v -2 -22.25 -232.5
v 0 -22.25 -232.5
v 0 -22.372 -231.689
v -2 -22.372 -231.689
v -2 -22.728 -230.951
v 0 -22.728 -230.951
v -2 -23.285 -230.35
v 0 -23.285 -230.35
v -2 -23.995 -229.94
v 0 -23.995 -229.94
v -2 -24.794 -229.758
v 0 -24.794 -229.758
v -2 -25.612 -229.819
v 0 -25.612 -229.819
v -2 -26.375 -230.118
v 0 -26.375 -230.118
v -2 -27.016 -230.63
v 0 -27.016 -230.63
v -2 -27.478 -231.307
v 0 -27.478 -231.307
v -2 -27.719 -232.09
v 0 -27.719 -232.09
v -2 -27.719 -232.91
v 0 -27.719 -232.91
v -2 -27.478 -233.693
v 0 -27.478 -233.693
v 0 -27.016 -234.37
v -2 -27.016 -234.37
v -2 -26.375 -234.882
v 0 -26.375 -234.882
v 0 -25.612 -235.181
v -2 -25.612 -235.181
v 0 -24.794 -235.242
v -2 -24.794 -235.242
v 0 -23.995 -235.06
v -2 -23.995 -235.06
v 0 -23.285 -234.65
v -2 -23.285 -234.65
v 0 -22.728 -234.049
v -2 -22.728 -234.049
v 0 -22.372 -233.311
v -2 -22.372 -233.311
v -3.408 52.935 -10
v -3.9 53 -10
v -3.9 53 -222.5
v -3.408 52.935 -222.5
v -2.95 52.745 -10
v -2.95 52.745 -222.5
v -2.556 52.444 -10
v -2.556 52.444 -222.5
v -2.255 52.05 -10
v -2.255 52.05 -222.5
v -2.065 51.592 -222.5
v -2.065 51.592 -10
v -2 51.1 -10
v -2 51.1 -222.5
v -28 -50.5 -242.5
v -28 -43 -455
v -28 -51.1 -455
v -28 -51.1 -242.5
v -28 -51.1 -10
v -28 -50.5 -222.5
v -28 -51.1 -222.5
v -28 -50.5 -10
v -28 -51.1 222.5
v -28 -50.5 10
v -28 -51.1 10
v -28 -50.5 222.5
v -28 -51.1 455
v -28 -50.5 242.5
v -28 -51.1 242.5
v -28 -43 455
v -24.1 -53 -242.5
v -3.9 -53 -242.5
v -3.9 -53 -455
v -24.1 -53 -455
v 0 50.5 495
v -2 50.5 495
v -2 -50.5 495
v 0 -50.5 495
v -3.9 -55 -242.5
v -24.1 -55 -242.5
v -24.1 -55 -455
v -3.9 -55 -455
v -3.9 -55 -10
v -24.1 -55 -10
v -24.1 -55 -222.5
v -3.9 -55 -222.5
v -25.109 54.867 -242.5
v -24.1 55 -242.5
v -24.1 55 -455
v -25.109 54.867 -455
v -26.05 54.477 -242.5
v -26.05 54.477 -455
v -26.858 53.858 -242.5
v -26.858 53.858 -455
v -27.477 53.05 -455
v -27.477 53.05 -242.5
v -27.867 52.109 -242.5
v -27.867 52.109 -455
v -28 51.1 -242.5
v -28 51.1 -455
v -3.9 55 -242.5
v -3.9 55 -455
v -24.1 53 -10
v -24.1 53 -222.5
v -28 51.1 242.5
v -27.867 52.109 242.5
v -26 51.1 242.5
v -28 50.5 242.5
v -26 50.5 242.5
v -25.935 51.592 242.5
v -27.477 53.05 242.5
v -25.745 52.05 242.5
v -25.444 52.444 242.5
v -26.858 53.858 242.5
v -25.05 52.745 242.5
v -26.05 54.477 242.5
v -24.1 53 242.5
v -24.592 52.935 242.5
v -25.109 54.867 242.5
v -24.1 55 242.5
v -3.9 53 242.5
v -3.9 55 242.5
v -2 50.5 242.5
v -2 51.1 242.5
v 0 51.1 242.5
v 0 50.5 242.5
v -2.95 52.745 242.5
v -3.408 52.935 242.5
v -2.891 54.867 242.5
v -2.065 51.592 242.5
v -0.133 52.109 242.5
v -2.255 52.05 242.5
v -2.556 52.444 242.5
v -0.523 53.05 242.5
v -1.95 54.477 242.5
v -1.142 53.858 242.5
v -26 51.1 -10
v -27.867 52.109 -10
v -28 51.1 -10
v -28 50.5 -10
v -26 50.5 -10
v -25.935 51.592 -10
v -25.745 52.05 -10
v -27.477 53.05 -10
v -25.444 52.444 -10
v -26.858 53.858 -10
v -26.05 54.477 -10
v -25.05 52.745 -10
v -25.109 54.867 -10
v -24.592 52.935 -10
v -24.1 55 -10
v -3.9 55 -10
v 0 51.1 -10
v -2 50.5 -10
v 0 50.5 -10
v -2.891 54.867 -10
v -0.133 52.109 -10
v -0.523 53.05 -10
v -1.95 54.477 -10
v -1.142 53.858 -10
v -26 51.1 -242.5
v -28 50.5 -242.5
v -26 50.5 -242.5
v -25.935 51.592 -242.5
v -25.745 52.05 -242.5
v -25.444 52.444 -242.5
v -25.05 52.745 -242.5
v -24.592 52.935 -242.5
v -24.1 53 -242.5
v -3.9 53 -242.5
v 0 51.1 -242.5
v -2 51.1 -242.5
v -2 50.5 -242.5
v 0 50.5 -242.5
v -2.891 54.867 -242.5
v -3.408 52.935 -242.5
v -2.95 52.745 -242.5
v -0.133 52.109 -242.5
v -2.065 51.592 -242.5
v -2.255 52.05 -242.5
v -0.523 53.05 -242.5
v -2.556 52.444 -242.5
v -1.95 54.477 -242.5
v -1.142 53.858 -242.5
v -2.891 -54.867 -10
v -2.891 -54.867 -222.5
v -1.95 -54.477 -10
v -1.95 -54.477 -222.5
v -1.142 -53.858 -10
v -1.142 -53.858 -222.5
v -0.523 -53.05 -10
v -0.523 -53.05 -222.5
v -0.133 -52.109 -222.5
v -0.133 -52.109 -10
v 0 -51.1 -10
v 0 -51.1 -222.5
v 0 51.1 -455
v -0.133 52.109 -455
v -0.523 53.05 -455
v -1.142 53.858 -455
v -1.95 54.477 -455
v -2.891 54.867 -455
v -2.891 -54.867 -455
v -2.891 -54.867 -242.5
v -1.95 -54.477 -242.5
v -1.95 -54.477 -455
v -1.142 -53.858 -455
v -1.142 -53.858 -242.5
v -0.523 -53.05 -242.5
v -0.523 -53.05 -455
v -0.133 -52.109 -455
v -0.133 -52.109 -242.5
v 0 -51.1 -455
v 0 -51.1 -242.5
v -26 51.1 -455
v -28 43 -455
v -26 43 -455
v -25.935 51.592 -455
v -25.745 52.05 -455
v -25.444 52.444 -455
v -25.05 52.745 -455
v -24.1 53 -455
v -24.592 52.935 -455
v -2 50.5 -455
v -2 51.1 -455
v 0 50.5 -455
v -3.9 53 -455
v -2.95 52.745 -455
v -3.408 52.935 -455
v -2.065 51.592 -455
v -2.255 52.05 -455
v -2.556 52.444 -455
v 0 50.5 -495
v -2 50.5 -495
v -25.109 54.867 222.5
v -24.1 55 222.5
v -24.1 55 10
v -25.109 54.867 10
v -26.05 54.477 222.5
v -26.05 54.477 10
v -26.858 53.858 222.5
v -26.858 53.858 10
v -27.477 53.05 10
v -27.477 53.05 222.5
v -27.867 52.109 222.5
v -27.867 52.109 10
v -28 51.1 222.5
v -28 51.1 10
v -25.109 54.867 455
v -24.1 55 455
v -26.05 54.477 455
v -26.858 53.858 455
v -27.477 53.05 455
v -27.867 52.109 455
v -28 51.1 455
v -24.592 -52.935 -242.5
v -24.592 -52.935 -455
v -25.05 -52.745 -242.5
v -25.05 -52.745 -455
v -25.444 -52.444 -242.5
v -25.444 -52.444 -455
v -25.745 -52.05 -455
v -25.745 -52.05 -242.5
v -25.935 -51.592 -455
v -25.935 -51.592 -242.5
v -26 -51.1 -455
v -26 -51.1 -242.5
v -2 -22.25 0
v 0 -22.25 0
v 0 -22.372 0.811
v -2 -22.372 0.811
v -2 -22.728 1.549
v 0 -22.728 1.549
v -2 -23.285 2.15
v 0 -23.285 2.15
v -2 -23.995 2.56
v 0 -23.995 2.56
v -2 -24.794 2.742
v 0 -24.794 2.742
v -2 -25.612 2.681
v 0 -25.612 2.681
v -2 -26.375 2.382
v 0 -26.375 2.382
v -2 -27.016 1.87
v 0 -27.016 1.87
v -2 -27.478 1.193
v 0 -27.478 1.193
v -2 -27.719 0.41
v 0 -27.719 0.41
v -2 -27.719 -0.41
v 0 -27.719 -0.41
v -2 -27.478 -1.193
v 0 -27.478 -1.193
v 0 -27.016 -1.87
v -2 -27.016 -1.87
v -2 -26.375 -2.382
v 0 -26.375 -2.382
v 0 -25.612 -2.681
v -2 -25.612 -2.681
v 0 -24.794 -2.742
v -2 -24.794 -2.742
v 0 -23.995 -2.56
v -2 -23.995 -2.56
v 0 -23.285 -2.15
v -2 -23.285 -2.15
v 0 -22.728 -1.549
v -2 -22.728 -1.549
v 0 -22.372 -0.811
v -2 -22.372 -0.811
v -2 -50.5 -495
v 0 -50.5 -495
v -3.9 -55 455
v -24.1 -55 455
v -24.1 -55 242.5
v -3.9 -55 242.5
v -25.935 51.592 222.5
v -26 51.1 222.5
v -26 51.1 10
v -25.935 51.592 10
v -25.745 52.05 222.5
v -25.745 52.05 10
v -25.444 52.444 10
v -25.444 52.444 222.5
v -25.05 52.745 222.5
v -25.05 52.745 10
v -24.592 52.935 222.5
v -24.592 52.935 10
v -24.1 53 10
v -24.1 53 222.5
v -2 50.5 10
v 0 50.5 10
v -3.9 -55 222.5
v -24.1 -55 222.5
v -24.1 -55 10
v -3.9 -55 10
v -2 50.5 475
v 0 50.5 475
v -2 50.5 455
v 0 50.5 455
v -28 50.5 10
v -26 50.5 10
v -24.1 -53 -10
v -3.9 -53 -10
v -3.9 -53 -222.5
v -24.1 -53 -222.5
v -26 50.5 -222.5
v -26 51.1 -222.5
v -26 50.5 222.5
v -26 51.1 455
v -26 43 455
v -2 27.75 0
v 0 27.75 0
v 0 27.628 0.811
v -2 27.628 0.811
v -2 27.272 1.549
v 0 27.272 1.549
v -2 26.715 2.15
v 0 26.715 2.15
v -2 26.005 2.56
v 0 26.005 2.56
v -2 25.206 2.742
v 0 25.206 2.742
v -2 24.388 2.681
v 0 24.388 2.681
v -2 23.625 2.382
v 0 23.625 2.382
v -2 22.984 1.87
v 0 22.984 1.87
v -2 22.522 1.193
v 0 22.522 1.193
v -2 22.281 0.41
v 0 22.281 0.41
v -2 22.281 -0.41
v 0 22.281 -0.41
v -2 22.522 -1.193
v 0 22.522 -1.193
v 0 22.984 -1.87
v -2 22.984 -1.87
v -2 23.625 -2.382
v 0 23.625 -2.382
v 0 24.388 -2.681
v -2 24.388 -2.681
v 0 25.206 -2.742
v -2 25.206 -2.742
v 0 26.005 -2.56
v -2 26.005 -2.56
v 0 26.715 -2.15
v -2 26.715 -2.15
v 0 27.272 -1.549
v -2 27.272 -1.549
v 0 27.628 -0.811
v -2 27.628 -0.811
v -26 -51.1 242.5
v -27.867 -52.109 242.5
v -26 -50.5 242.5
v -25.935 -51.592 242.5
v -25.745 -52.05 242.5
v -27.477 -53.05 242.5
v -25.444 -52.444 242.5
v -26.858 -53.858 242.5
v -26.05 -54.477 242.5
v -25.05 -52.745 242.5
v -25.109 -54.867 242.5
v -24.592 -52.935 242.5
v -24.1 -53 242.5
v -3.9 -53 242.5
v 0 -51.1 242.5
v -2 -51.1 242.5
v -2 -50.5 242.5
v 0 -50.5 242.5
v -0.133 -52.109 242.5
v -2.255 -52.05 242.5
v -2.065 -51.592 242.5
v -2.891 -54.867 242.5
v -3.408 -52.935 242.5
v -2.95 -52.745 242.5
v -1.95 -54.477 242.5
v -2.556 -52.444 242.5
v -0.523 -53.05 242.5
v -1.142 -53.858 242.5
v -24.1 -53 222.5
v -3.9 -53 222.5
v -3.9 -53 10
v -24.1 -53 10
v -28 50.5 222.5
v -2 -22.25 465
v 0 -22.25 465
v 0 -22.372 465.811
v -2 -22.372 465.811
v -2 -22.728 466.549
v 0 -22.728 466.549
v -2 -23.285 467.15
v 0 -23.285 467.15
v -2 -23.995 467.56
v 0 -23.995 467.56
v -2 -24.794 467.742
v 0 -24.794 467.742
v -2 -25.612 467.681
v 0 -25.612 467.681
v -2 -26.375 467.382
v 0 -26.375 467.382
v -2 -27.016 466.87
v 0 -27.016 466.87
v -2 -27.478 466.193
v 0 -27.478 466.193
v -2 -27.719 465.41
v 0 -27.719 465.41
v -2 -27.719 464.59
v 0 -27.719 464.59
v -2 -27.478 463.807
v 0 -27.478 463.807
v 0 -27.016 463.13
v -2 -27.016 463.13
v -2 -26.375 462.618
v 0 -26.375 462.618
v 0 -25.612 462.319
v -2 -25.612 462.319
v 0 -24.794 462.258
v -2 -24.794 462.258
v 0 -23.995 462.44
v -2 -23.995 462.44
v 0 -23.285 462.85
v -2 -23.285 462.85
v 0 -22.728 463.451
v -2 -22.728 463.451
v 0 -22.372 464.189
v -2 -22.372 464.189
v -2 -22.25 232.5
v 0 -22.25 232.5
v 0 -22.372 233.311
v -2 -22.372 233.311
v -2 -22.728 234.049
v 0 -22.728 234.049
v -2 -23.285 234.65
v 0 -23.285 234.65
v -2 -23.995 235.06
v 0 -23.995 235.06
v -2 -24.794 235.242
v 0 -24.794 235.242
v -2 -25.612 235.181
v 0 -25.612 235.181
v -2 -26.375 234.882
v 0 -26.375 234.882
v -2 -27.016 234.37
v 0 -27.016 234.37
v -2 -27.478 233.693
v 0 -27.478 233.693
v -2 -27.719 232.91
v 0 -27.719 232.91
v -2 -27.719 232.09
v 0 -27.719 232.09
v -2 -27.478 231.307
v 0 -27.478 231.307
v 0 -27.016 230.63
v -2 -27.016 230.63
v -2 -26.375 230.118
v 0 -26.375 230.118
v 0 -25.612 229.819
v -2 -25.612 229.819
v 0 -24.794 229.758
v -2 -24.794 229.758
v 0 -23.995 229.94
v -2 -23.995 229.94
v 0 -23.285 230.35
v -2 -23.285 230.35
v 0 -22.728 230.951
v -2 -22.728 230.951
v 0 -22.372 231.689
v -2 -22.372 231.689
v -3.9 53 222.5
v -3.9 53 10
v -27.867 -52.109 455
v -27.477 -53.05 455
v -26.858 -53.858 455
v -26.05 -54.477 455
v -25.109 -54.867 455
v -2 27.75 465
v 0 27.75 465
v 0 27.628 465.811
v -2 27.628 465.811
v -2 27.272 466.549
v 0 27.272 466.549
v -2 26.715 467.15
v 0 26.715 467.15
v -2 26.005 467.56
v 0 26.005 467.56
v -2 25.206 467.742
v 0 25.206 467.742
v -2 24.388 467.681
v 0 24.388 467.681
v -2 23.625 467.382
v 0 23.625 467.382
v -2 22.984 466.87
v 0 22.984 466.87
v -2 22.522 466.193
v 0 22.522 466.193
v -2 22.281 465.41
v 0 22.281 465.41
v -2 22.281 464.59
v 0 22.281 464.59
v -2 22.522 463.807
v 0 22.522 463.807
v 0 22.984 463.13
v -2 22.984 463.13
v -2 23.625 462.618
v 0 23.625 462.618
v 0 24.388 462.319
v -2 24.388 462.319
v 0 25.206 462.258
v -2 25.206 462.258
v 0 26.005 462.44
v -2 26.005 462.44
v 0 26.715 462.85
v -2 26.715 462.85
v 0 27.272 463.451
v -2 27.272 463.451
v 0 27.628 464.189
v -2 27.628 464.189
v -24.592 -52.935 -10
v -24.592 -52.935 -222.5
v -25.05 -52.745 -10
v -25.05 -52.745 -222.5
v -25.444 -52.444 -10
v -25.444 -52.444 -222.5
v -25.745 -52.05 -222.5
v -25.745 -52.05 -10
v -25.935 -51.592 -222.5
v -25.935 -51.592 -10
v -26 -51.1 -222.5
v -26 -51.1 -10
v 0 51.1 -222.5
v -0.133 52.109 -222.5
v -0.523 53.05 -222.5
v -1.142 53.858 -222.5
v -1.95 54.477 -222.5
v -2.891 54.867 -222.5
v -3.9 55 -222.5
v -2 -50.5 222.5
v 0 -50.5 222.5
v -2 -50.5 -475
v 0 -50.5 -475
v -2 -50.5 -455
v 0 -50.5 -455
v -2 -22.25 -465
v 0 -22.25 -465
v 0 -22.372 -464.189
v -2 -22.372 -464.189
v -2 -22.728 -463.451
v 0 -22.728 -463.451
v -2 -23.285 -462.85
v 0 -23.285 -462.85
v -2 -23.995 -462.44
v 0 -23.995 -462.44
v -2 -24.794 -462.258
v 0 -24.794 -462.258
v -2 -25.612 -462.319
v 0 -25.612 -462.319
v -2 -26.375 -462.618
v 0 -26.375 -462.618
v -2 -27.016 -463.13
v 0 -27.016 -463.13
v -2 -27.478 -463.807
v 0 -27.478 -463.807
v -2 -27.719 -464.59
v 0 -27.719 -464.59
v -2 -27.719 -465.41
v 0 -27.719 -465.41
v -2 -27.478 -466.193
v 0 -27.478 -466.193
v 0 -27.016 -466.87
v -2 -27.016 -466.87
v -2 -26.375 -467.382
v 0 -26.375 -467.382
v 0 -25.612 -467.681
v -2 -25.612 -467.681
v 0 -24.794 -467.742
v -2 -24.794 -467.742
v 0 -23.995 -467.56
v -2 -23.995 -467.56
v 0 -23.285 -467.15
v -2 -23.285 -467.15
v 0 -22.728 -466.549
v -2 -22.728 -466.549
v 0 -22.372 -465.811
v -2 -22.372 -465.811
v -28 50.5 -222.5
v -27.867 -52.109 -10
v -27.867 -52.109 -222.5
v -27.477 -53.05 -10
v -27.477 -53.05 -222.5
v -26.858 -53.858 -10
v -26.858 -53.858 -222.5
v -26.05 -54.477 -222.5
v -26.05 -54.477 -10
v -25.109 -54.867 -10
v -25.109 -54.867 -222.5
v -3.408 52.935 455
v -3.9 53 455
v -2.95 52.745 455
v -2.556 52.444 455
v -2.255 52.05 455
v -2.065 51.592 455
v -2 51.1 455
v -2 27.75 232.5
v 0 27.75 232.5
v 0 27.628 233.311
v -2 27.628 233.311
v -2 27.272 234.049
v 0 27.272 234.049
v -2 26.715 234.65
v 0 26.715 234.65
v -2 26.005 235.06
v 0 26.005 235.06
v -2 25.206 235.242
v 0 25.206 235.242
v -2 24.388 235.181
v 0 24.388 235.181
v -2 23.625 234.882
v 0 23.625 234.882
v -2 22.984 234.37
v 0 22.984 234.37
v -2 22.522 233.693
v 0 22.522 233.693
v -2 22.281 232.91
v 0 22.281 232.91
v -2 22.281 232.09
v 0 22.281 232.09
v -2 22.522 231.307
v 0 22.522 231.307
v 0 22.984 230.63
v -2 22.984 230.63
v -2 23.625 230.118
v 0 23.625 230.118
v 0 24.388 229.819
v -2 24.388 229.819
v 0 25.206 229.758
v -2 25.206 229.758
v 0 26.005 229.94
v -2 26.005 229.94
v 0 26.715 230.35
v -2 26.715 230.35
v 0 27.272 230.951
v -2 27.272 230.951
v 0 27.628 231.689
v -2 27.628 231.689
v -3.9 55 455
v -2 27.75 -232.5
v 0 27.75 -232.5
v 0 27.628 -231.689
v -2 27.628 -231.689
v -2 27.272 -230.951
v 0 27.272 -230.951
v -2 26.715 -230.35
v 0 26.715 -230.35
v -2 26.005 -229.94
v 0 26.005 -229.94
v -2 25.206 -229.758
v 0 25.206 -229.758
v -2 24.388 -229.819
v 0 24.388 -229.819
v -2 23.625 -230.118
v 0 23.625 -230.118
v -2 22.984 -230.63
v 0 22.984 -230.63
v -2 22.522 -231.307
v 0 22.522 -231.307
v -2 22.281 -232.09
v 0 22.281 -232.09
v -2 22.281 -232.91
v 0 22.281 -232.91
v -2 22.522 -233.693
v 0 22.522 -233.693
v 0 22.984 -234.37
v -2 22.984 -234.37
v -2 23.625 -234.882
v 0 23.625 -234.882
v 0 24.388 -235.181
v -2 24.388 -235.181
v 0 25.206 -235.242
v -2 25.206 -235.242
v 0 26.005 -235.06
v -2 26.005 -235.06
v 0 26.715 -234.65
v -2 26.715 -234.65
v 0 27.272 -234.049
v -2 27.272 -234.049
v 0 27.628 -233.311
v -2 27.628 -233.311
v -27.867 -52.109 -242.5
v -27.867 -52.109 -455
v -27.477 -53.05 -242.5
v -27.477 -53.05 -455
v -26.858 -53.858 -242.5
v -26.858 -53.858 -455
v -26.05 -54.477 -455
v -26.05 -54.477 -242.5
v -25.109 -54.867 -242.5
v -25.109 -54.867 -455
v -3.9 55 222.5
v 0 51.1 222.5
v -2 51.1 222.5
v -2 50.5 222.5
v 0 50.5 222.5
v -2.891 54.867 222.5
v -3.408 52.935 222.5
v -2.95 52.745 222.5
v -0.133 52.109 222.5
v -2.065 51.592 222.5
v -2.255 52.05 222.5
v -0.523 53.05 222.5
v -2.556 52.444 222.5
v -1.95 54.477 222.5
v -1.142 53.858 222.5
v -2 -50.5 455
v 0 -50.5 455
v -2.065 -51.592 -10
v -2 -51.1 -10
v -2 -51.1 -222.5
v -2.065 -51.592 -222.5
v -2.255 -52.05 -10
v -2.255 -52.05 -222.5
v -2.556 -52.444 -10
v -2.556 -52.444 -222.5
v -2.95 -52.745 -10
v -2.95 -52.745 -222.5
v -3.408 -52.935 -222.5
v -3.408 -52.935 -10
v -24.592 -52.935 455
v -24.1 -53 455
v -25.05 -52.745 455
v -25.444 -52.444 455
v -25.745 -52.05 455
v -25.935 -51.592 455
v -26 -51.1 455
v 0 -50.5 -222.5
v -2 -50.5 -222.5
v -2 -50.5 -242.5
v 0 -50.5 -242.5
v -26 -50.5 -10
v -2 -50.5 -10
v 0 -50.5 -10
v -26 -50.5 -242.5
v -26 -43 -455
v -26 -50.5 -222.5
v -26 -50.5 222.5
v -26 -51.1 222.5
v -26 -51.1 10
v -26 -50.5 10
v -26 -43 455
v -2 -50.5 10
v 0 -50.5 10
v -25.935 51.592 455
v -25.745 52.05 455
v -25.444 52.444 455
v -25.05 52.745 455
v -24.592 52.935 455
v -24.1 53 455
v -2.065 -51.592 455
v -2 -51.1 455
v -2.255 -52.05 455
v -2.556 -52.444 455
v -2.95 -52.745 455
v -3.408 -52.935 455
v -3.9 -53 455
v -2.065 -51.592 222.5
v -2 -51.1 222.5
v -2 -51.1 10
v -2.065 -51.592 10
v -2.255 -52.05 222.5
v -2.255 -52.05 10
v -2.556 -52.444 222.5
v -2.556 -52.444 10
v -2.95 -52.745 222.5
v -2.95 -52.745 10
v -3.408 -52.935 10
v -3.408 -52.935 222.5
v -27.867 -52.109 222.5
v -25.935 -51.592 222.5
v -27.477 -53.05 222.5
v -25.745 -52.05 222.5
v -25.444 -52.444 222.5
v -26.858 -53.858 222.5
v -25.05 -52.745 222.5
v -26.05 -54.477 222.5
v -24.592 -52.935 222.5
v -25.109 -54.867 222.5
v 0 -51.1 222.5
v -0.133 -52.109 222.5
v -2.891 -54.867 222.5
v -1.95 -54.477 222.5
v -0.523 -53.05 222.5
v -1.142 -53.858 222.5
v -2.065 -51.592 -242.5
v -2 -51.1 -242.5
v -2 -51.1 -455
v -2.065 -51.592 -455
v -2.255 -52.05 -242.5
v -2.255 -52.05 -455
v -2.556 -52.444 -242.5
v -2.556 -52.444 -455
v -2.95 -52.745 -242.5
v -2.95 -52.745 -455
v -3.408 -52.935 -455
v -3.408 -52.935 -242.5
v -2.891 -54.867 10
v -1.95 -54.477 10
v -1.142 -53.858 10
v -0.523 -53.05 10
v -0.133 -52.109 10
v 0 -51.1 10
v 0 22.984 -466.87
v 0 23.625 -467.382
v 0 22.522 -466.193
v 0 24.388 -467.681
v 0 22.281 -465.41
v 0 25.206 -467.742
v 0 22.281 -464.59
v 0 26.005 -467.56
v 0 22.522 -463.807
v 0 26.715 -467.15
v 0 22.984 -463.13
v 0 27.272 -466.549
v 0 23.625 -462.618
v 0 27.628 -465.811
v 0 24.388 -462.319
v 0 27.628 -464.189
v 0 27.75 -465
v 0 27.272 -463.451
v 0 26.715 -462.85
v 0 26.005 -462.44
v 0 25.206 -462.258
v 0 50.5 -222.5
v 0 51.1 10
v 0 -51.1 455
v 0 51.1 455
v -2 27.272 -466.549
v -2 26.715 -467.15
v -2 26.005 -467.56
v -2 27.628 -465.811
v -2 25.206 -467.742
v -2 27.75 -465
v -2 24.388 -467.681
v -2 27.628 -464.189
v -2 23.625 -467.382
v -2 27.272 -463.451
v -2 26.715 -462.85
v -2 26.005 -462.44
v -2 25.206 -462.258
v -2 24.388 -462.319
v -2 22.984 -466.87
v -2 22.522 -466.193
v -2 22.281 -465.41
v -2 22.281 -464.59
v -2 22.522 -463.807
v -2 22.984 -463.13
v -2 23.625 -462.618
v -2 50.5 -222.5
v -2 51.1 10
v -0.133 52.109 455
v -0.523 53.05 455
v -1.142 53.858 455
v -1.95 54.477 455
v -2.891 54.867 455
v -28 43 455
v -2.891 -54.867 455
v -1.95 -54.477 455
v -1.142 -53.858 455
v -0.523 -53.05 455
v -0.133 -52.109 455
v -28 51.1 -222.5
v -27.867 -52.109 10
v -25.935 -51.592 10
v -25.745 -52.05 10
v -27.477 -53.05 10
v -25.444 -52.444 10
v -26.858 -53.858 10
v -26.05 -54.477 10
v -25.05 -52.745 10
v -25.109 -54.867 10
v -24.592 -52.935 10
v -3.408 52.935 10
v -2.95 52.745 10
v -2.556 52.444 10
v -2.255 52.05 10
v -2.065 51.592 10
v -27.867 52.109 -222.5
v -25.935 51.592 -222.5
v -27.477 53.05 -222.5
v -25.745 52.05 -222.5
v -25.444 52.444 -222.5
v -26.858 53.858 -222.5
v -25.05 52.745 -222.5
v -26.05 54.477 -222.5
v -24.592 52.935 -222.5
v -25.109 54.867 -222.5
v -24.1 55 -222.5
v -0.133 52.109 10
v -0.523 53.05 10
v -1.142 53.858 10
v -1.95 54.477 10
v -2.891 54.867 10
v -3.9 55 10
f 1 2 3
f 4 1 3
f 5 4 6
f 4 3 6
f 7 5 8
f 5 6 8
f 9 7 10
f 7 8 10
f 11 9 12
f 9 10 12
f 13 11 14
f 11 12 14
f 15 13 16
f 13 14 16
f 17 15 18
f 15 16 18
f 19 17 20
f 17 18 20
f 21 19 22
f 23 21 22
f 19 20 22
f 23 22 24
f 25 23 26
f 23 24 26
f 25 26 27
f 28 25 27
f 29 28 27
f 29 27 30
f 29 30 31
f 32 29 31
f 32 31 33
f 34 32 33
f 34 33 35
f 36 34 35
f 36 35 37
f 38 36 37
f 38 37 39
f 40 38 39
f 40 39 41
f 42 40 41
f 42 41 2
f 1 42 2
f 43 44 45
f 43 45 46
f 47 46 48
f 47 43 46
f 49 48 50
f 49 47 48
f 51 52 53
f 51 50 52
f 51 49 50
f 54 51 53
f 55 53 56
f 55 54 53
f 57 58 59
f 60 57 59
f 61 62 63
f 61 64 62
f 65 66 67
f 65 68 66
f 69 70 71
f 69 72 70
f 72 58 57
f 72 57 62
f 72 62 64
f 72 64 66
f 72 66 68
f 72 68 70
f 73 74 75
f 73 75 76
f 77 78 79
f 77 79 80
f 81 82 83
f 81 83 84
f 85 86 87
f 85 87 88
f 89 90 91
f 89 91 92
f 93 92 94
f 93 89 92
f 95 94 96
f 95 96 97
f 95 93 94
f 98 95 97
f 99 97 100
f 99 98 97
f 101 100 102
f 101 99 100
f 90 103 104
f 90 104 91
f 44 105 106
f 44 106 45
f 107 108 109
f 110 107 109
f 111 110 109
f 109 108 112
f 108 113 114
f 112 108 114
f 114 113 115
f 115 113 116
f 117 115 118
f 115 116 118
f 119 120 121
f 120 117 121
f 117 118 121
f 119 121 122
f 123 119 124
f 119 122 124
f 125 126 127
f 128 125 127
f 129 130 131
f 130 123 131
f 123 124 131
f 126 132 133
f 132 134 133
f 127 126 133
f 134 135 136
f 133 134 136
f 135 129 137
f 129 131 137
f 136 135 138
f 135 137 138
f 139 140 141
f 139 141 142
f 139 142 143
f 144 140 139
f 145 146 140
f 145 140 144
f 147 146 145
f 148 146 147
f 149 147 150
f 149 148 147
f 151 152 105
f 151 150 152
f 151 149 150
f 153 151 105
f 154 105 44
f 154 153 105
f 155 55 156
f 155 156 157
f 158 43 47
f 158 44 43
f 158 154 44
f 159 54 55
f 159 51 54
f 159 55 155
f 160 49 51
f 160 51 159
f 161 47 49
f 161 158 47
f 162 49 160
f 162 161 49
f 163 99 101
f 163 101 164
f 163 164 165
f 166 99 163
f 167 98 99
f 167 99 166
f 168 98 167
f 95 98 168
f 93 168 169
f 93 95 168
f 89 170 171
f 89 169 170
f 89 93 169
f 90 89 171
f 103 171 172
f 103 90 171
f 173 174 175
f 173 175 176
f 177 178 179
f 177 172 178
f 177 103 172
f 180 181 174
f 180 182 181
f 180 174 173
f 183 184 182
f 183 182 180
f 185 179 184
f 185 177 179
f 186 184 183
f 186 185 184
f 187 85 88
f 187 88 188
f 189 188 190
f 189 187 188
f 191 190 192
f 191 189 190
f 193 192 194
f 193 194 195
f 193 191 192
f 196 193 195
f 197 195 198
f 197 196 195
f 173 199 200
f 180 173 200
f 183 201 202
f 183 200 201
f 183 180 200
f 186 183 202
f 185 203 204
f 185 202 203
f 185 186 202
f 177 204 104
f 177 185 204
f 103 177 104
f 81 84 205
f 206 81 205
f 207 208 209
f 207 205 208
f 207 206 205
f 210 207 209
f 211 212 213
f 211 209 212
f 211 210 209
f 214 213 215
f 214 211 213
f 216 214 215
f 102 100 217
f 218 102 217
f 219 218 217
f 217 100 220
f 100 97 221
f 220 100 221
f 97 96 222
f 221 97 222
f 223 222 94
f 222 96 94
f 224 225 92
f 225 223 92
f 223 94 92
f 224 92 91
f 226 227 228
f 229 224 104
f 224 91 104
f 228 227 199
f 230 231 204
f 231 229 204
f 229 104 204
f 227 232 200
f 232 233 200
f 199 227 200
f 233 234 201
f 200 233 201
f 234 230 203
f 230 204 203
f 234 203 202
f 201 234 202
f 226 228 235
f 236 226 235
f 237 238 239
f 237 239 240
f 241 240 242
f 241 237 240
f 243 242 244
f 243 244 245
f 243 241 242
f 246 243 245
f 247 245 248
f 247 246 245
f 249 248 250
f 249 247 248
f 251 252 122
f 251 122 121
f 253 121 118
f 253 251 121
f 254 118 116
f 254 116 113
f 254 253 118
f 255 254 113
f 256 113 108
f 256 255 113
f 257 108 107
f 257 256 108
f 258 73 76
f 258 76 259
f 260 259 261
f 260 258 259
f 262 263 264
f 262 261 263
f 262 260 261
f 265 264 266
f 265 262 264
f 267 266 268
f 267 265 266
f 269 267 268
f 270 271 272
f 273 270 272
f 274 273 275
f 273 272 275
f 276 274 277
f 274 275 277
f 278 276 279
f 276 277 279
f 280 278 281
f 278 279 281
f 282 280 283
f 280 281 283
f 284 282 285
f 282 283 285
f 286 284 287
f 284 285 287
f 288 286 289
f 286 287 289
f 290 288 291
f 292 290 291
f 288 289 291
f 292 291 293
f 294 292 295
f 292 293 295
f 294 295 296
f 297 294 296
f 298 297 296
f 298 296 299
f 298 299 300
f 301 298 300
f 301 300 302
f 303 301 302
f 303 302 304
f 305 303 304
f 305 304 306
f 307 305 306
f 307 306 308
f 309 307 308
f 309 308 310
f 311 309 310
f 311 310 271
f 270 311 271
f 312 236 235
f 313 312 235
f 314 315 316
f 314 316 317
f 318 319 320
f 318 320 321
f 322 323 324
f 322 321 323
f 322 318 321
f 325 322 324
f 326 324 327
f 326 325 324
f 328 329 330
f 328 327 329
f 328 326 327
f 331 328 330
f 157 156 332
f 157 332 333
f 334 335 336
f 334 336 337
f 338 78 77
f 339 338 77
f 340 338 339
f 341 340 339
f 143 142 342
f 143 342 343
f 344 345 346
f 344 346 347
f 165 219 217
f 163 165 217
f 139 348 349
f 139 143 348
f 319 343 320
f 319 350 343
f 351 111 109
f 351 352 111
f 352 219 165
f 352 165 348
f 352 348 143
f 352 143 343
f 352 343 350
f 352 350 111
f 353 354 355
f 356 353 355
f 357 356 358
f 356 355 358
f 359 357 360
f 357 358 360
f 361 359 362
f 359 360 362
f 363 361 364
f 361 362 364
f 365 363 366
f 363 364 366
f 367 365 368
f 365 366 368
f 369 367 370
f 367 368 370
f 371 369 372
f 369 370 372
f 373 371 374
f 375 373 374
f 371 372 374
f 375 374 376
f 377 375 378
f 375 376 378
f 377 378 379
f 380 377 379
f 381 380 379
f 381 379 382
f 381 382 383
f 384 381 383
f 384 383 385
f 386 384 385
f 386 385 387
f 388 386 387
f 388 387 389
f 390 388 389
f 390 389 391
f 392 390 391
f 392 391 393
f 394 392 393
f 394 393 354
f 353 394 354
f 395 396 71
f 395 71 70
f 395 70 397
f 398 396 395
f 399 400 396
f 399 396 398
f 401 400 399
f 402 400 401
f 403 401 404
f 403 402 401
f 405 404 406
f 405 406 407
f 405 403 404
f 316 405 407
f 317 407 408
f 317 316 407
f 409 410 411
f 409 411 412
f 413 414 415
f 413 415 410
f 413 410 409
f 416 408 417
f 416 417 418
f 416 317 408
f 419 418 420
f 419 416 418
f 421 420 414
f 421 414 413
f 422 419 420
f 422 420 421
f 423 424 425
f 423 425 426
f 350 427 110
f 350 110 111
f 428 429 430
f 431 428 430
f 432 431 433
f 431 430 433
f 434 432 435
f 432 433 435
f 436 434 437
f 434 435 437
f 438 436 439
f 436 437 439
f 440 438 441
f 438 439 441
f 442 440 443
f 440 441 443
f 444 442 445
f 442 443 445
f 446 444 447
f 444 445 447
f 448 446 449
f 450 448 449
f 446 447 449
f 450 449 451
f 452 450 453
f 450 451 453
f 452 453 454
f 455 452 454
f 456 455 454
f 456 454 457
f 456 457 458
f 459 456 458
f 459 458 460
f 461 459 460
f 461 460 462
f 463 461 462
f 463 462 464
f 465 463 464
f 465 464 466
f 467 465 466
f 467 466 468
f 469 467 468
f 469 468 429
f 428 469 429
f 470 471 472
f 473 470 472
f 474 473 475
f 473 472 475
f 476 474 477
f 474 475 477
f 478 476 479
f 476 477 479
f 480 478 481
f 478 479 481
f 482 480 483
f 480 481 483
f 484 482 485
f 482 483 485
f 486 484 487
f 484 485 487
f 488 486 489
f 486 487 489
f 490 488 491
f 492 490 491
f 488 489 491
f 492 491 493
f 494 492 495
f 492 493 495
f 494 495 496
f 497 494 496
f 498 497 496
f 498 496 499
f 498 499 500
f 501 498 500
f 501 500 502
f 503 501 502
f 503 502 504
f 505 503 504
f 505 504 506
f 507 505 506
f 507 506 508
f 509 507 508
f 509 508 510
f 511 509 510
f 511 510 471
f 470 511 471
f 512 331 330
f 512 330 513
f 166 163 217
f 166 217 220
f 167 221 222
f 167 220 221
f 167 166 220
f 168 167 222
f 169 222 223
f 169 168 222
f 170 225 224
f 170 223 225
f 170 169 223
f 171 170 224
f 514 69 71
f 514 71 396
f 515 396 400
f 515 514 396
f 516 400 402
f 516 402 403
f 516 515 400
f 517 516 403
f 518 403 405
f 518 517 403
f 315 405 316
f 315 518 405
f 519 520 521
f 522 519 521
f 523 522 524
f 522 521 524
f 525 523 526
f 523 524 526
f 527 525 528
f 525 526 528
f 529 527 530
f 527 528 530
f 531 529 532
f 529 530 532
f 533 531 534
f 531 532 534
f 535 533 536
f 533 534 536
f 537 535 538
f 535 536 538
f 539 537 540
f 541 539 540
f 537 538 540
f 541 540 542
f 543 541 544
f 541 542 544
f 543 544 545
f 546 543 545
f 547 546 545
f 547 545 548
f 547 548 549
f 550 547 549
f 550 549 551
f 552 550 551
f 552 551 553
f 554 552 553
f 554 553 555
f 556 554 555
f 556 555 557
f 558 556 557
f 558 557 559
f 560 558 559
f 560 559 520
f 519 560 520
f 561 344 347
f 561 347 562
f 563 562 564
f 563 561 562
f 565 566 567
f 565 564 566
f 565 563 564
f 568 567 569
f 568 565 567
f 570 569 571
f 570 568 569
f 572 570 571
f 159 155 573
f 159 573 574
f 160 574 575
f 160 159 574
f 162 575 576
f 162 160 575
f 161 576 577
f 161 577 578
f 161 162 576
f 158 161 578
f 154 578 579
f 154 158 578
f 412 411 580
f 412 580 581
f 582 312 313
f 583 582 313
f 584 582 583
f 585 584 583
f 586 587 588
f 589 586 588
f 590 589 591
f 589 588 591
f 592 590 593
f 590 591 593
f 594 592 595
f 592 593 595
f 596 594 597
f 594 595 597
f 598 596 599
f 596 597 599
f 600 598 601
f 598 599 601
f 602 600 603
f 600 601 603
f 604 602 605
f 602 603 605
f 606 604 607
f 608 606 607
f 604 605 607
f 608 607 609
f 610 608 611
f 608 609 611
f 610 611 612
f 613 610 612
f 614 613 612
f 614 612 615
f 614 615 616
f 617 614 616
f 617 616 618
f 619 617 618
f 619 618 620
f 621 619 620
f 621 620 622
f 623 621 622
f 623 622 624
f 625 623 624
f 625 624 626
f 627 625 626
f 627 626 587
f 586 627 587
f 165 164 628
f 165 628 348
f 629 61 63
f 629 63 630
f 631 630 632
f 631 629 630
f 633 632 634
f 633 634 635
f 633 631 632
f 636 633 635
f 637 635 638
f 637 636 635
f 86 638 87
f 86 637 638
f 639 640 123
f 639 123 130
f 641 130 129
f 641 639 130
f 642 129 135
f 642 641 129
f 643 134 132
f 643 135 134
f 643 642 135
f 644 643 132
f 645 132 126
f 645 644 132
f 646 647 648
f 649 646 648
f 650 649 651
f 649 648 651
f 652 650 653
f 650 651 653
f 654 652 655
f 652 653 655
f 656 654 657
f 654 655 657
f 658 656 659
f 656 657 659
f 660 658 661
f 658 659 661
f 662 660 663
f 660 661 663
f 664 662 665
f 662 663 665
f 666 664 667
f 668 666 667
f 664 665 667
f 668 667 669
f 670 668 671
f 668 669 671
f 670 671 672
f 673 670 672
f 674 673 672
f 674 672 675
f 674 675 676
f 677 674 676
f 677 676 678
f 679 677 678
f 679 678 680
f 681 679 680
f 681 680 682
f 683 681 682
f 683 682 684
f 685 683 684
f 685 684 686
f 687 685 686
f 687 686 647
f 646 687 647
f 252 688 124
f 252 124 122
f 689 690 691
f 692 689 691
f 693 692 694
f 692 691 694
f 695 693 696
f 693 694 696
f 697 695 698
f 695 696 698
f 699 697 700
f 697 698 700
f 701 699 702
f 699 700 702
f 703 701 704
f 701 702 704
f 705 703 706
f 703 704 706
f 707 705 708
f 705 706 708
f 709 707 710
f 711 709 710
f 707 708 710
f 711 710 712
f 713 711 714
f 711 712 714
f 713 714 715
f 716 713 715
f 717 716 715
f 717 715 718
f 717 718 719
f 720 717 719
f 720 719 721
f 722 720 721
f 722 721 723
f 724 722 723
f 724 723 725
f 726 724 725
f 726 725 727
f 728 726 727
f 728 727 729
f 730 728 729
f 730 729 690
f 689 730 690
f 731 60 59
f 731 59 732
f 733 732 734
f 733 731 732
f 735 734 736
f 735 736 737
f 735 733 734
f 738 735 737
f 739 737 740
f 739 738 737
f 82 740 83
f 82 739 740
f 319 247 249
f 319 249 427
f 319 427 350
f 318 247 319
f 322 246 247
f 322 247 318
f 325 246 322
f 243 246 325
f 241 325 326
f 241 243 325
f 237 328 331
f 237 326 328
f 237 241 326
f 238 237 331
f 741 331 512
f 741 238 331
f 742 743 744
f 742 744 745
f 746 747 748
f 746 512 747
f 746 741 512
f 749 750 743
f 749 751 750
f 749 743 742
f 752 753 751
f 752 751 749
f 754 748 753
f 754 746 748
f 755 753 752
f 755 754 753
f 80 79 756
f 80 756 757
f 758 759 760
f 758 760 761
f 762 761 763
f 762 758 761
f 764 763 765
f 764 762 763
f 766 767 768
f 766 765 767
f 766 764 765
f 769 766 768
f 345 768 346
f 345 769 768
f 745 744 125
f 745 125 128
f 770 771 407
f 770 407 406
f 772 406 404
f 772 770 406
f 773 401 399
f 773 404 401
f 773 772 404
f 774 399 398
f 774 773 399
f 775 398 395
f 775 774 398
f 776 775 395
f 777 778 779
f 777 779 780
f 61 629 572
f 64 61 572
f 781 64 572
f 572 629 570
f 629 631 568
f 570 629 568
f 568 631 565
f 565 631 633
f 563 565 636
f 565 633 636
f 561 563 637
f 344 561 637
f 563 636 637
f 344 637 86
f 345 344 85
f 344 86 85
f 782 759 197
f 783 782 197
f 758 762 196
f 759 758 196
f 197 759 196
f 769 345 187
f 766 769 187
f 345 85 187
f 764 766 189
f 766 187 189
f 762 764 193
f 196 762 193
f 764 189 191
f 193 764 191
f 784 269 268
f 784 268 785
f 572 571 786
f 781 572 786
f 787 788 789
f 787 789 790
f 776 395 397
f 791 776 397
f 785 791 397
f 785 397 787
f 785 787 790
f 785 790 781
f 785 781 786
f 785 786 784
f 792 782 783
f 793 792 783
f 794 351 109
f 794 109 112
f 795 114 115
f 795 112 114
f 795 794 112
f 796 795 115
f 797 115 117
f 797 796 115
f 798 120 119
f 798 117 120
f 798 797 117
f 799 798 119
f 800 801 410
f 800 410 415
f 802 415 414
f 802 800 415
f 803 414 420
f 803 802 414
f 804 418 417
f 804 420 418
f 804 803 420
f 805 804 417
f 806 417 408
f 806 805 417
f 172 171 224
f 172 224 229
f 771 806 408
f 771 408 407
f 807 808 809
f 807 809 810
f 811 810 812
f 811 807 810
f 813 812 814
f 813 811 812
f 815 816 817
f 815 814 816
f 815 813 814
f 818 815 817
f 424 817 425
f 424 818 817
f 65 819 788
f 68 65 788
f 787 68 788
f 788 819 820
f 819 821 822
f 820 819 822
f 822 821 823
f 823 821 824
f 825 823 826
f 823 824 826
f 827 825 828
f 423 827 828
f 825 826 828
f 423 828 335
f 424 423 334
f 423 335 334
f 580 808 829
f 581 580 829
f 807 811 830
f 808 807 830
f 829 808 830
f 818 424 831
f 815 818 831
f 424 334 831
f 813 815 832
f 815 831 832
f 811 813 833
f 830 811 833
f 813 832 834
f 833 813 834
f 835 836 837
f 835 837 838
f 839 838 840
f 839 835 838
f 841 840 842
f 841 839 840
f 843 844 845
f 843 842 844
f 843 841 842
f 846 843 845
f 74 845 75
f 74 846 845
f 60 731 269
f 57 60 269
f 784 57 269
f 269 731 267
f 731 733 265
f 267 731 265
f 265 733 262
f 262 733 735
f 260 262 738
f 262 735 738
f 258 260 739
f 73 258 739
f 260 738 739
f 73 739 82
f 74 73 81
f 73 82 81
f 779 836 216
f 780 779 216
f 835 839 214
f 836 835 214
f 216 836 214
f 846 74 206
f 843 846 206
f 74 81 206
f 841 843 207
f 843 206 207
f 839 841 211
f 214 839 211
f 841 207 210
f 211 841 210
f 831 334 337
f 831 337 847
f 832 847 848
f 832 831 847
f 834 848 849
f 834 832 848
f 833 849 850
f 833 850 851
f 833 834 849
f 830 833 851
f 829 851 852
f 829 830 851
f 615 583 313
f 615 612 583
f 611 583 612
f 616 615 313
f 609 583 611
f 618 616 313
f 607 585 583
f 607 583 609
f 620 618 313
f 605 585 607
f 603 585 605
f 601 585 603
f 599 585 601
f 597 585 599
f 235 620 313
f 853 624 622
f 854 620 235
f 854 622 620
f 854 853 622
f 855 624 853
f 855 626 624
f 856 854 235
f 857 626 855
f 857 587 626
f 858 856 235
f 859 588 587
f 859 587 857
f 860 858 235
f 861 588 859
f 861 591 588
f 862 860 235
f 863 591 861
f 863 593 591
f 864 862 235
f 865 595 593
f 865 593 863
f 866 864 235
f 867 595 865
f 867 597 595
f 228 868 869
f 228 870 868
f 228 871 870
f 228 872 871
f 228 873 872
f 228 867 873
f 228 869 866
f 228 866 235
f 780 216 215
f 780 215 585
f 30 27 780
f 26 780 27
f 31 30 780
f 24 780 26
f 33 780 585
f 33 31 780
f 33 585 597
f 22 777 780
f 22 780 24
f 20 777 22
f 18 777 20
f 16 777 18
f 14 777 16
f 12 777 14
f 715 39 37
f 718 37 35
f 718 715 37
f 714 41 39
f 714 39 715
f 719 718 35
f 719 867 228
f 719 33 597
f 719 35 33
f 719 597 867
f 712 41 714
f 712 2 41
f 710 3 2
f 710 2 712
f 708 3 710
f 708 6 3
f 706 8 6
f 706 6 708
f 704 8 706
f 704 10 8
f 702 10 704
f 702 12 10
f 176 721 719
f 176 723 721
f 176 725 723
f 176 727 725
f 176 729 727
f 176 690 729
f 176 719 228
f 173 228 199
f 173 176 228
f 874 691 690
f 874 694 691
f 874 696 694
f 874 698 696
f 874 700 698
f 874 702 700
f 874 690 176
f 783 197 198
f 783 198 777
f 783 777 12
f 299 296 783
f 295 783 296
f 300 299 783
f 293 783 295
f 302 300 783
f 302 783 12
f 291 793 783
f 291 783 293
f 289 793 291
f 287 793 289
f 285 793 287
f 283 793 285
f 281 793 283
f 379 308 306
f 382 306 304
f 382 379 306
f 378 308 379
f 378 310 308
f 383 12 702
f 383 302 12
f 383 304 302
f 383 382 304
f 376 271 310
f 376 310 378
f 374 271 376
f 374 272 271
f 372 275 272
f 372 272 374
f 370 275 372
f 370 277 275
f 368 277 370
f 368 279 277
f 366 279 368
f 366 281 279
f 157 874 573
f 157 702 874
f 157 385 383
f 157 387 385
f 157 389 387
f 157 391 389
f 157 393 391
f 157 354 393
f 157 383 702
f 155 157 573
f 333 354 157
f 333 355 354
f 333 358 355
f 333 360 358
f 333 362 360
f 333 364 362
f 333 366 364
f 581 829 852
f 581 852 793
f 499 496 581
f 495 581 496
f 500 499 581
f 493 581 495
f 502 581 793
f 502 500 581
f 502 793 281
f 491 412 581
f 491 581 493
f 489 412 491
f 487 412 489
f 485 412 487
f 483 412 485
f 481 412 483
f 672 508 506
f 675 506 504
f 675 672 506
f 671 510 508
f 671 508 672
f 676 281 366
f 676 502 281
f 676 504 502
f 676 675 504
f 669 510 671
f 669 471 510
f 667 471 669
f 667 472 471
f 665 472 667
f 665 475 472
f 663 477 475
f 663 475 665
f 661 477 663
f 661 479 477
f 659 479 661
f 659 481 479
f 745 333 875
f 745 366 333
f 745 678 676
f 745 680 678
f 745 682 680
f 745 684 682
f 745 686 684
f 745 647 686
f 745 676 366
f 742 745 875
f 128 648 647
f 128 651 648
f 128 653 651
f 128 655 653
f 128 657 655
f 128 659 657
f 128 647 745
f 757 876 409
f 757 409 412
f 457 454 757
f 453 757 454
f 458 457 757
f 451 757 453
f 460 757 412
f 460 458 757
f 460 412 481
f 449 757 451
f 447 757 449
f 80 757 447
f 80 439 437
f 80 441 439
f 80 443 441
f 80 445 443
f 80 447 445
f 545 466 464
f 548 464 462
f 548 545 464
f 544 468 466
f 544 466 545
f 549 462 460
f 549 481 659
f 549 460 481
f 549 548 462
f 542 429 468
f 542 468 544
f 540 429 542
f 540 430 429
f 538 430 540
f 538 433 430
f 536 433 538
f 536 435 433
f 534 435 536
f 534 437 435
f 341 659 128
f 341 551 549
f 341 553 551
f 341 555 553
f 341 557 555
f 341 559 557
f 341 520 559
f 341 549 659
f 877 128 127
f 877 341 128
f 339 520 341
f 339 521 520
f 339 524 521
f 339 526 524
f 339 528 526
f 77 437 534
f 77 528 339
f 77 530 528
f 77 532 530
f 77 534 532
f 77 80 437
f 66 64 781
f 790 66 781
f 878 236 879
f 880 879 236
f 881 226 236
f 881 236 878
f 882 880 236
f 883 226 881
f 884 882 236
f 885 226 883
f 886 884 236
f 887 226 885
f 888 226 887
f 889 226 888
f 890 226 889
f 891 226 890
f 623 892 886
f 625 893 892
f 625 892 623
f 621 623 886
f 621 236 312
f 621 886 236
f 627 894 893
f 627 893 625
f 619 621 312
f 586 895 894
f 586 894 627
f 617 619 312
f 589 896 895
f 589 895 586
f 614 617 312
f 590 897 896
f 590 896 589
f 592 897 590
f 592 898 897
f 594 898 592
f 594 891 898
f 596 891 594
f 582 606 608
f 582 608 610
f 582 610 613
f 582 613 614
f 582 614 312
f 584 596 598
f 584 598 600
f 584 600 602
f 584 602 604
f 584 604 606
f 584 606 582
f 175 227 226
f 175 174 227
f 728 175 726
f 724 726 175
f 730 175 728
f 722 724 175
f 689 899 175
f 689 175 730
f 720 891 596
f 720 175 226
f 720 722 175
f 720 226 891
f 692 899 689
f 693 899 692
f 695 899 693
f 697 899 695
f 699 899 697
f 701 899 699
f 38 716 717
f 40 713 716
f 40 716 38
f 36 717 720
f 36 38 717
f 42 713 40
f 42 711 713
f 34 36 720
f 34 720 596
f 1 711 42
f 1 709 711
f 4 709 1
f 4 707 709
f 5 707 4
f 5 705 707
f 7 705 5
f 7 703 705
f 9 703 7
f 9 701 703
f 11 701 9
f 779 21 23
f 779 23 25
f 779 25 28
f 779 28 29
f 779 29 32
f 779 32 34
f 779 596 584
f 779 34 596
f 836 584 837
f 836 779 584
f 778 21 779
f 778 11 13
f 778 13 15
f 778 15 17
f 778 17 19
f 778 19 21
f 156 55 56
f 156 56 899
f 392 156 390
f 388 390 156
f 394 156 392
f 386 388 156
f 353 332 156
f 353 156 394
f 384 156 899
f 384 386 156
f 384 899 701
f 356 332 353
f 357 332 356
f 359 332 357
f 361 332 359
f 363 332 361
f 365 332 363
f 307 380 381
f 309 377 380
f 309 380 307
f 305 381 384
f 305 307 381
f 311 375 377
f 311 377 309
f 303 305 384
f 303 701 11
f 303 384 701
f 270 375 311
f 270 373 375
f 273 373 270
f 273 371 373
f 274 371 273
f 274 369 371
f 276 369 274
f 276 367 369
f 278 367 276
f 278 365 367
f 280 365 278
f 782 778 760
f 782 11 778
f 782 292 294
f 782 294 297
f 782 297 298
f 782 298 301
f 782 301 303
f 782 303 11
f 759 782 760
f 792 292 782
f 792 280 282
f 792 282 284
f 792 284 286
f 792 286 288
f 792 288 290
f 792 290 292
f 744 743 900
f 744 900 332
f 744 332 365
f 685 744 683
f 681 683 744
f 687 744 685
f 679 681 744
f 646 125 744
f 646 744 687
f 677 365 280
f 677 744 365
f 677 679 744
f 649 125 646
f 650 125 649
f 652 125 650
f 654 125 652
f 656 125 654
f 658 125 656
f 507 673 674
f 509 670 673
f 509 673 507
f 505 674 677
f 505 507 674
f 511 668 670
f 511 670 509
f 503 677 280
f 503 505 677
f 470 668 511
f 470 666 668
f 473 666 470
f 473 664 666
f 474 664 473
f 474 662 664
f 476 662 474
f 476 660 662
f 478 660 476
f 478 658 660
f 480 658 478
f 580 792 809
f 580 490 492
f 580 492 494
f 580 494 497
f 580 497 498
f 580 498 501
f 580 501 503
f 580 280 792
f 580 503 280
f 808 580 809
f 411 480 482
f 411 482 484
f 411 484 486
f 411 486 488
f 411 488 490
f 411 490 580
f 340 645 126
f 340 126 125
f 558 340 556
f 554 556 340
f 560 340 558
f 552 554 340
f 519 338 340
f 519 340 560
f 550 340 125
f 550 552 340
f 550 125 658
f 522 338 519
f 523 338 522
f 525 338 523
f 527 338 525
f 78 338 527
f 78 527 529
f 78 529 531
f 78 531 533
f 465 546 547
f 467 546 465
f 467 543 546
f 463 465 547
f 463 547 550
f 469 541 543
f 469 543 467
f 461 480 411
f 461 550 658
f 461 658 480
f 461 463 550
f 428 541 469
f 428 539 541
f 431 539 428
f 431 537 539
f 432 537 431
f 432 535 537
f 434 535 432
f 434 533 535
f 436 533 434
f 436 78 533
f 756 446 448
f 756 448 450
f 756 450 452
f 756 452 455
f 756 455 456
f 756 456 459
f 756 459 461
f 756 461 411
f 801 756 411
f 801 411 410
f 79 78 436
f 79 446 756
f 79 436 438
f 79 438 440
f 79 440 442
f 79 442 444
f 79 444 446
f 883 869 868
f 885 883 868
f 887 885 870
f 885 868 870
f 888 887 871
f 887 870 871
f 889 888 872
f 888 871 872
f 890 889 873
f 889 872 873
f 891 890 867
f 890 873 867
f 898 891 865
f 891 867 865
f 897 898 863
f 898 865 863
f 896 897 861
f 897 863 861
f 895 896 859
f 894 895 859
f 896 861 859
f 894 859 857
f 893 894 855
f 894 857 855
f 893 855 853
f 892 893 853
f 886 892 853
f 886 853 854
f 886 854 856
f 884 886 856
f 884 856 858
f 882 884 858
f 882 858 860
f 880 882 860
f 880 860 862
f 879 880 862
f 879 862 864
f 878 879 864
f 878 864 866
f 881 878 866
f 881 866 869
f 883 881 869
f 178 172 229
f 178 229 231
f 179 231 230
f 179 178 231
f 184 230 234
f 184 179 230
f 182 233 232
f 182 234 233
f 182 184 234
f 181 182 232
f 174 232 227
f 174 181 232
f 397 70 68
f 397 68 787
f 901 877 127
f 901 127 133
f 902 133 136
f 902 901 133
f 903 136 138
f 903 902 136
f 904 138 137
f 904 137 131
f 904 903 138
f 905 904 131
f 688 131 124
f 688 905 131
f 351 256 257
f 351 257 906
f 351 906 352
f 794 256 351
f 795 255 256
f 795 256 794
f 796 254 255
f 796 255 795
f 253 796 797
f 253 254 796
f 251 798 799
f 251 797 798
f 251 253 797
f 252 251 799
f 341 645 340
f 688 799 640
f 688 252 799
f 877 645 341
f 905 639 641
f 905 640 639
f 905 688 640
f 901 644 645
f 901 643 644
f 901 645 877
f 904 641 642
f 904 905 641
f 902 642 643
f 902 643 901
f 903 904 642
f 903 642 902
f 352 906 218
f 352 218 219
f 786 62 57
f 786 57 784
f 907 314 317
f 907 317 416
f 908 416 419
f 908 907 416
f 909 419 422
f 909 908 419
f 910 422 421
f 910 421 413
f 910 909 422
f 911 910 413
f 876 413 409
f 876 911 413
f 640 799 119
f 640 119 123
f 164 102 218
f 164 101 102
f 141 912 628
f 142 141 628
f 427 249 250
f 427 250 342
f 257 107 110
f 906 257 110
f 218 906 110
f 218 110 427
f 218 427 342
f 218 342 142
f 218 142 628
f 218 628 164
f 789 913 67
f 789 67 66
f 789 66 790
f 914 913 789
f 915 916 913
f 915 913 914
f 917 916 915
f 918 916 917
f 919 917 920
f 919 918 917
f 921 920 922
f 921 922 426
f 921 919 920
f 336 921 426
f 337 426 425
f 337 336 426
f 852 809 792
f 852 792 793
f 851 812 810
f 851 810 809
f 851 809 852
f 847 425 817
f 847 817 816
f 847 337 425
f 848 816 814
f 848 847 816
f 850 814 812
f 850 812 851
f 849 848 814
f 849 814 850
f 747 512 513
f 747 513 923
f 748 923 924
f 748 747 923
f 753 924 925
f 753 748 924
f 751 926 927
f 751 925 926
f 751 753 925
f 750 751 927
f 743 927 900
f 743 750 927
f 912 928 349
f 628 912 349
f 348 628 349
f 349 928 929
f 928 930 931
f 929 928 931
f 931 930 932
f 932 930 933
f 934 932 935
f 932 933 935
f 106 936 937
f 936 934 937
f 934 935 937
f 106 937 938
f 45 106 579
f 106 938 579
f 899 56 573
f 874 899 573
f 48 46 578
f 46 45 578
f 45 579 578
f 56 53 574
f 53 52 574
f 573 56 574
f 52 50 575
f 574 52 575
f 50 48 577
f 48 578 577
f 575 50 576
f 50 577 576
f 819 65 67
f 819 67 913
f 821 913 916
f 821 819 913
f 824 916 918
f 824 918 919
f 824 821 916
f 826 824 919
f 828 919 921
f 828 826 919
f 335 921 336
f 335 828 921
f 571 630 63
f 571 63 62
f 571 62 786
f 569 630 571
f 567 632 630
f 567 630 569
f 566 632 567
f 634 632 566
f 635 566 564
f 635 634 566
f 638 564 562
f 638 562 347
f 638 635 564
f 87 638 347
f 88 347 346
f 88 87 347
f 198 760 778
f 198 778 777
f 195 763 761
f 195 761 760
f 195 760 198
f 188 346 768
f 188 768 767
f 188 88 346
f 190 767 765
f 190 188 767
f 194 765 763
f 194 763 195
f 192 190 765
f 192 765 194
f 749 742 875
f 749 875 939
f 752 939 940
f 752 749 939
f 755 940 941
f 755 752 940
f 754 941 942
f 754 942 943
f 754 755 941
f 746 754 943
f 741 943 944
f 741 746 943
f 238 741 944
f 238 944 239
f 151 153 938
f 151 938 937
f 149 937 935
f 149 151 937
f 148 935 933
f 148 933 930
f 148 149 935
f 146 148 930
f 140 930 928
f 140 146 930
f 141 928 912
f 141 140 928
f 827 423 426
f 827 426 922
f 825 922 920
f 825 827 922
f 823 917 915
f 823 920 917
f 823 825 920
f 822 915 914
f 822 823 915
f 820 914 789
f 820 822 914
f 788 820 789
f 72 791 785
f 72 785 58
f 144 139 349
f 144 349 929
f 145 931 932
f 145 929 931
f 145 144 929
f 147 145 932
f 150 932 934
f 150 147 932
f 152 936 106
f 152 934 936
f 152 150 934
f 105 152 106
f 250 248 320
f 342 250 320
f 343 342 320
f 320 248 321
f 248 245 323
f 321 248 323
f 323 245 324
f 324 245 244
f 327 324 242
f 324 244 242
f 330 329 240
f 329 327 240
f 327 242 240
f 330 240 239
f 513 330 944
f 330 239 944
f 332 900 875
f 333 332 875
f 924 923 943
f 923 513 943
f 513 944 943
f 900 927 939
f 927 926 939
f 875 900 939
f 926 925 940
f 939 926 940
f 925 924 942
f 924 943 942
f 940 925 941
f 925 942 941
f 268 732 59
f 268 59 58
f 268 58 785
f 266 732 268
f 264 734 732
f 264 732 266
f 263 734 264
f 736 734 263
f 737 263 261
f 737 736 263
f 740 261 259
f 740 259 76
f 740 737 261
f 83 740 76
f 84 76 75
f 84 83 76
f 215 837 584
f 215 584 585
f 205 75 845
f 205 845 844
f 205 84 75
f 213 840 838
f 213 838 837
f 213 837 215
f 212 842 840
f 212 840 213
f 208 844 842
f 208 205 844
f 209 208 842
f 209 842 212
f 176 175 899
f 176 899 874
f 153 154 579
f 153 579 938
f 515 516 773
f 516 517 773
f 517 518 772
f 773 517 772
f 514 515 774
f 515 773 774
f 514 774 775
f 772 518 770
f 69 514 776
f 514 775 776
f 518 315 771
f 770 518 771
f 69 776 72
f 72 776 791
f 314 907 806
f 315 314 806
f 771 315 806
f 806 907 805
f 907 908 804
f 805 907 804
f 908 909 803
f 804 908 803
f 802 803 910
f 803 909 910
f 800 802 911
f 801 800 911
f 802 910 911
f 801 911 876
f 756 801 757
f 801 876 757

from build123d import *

# Parameters (mm, degrees)
BASE_FLANGE1_DEPTH      = 495
SKETCH6_W               = 30.5
SKETCH6_H               = 20
CUT_EXTRUDE1_DEPTH      = 4.5
LPATTERN1_COUNT         = 3
LPATTERN1_PITCH         = 232.5
LPATTERN1_COL_COUNT     = 3
LPATTERN1_COL_PITCH     = 232.5
MIRROR1_COPY_1_SKETCH_W = 30.5
MIRROR1_COPY_1_SKETCH_H = 20
MIRROR1_COPY_1_DEPTH    = 4.5
MIRROR1_COPY_2_SKETCH_W = 30.5
MIRROR1_COPY_2_SKETCH_H = 20
MIRROR1_COPY_2_DEPTH    = 4.5
MIRROR1_COPY_3_SKETCH_W = 30.5
MIRROR1_COPY_3_SKETCH_H = 20
MIRROR1_COPY_3_DEPTH    = 4.5
MIRROR1_COPY_4_SKETCH_W = 30.5
MIRROR1_COPY_4_SKETCH_H = 20
MIRROR1_COPY_4_DEPTH    = 4.5
CUT_EXTRUDE2_START      = -26
SKETCH7_W               = 40
SKETCH7_H               = 110
CUT_EXTRUDE2_DEPTH      = 26
SKETCH8_W               = 28.862585434
SKETCH8_H               = 32.444228354
SKETCH8_W_2             = 23.227575409
SKETCH8_H_2             = 8.085236505
CUT_EXTRUDE3_DEPTH      = 4.5
CUT_EXTRUDE4_START      = -26
SKETCH9_W               = 93.672664124
SKETCH9_H               = 132.08314216
CUT_EXTRUDE4_DEPTH      = 26
SKETCH10_W              = 25.364032915
SKETCH10_H              = 10.922603619
SKETCH10_W_2            = 22.654683255
SKETCH10_H_2            = 8.37911004
CUT_EXTRUDE5_DEPTH      = 4.5
SKETCH11_R              = 2.75
CUT_EXTRUDE6_DEPTH      = 499.832637264
LPATTERN2_COUNT         = 3
LPATTERN2_PITCH         = 232.5
LPATTERN2_COL_COUNT     = 3
LPATTERN2_COL_PITCH     = 232.5


# Sheet-metal steps are written as plain solids
with BuildPart() as part:
    # Sketch1 → Base-Flange1 (new, symmetric)
    with BuildSketch(Plane.XY):
        with BuildLine():
            Line((-28, -43), (-28, -51.1))
            ThreePointArc((-28, -51.1), (-26.857716447, -53.857716447), (-24.1, -55))
            Line((-24.1, -55), (-3.9, -55))
            ThreePointArc((-3.9, -55), (-1.142283553, -53.857716447), (0, -51.1))
            Line((0, -51.1), (0, 51.1))
            ThreePointArc((0, 51.1), (-1.142283553, 53.857716447), (-3.9, 55))
            Line((-3.9, 55), (-24.1, 55))
            ThreePointArc((-24.1, 55), (-26.857716447, 53.857716447), (-28, 51.1))
            Line((-28, 51.1), (-28, 43))
            Line((-28, 43), (-26, 43))
            Line((-26, 43), (-26, 51.1))
            ThreePointArc((-26, 51.1), (-25.443502884, 52.443502884), (-24.1, 53))
            Line((-24.1, 53), (-3.9, 53))
            ThreePointArc((-3.9, 53), (-2.556497116, 52.443502884), (-2, 51.1))
            Line((-2, 51.1), (-2, -51.1))
            ThreePointArc((-2, -51.1), (-2.556497116, -52.443502884), (-3.9, -53))
            Line((-3.9, -53), (-24.1, -53))
            ThreePointArc((-24.1, -53), (-25.443502884, -52.443502884), (-26, -51.1))
            Line((-26, -51.1), (-26, -43))
            Line((-26, -43), (-28, -43))
        make_face()
    extrude(amount=BASE_FLANGE1_DEPTH, both=True)

    # Sketch6 → Cut-Extrude1 (cut)
    with BuildSketch(Plane(origin=(0, 55, 0), x_dir=(1, 0, 0), z_dir=(0, 1, 0))):
        with Locations((-14, 0)):
            Rectangle(SKETCH6_W, SKETCH6_H)
    cut_extrude1 = extrude(amount=-CUT_EXTRUDE1_DEPTH, mode=Mode.SUBTRACT)

    # LPattern1: Cut-Extrude1 ×3
    with Locations(*[(0, 0, -i * LPATTERN1_PITCH) for i in range(1, LPATTERN1_COUNT)]):
        add(cut_extrude1, mode=Mode.SUBTRACT)

    # LPattern1 col: Cut-Extrude1 ×3
    with Locations(*[(0, 0, i * LPATTERN1_COL_PITCH) for i in range(1, LPATTERN1_COL_COUNT)]):
        add(cut_extrude1, mode=Mode.SUBTRACT)

    # Mirror1: Cut-Extrude1 across plane
    add(cut_extrude1.mirror(Plane.ZX), mode=Mode.SUBTRACT)

    # Mirror1 copy 1 sketch → Mirror1 copy 1 (cut)
    with BuildSketch(Plane(origin=(0, -55, -232.5), x_dir=(1, 0, 0), z_dir=(0, -1, 0))):
        with Locations((-14, 0)):
            Rectangle(MIRROR1_COPY_1_SKETCH_W, MIRROR1_COPY_1_SKETCH_H)
    extrude(amount=-MIRROR1_COPY_1_DEPTH, mode=Mode.SUBTRACT)

    # Mirror1 copy 2 sketch → Mirror1 copy 2 (cut)
    with BuildSketch(Plane(origin=(0, -55, -465), x_dir=(1, 0, 0), z_dir=(0, -1, 0))):
        with Locations((-14, 0)):
            Rectangle(MIRROR1_COPY_2_SKETCH_W, MIRROR1_COPY_2_SKETCH_H)
    extrude(amount=-MIRROR1_COPY_2_DEPTH, mode=Mode.SUBTRACT)

    # Mirror1 copy 3 sketch → Mirror1 copy 3 (cut)
    with BuildSketch(Plane(origin=(0, -55, 232.5), x_dir=(1, 0, 0), z_dir=(0, -1, 0))):
        with Locations((-14, 0)):
            Rectangle(MIRROR1_COPY_3_SKETCH_W, MIRROR1_COPY_3_SKETCH_H)
    extrude(amount=-MIRROR1_COPY_3_DEPTH, mode=Mode.SUBTRACT)

    # Mirror1 copy 4 sketch → Mirror1 copy 4 (cut)
    with BuildSketch(Plane(origin=(0, -55, 465), x_dir=(1, 0, 0), z_dir=(0, -1, 0))):
        with Locations((-14, 0)):
            Rectangle(MIRROR1_COPY_4_SKETCH_W, MIRROR1_COPY_4_SKETCH_H)
    extrude(amount=-MIRROR1_COPY_4_DEPTH, mode=Mode.SUBTRACT)

    # Sketch7 → Cut-Extrude2 (cut)
    with BuildSketch(Plane.ZY.offset(28).offset(CUT_EXTRUDE2_START)):
        with Locations((475, 0)):
            Rectangle(SKETCH7_W, SKETCH7_H)
    extrude(amount=CUT_EXTRUDE2_DEPTH, mode=Mode.SUBTRACT)

    # Sketch8 → Cut-Extrude3 (cut)
    with BuildSketch(Plane(origin=(0, 0, 0), x_dir=(0, 0, -1), z_dir=(1, 0, 0))):
        with Locations((-489.431292717, -66.722114177)):
            Rectangle(SKETCH8_W, SKETCH8_H)
        with Locations((-486.613787705, 54.542618253)):
            Rectangle(SKETCH8_W_2, SKETCH8_H_2)
    extrude(amount=-CUT_EXTRUDE3_DEPTH, mode=Mode.SUBTRACT)

    # Sketch9 → Cut-Extrude4 (cut)
    with BuildSketch(Plane.ZY.offset(28).offset(CUT_EXTRUDE4_START)):
        with Locations((-501.836332062, -11.04157108)):
            Rectangle(SKETCH9_W, SKETCH9_H)
    extrude(amount=CUT_EXTRUDE4_DEPTH, mode=Mode.SUBTRACT)

    # Sketch10 → Cut-Extrude5 (cut)
    with BuildSketch(Plane(origin=(0, 0, 0), x_dir=(0, 0, -1), z_dir=(1, 0, 0))):
        with Locations((487.682016458, -55.96130181)):
            Rectangle(SKETCH10_W, SKETCH10_H)
        with Locations((486.327341628, 54.68955502)):
            Rectangle(SKETCH10_W_2, SKETCH10_H_2)
    extrude(amount=-CUT_EXTRUDE5_DEPTH, mode=Mode.SUBTRACT)

    # Sketch11 → Cut-Extrude6 (cut, through all)
    with BuildSketch(Plane(origin=(0, 0, 0), x_dir=(0, 0, -1), z_dir=(1, 0, 0))):
        with Locations(Location((0, -25, 0), (0, 0, 90))):
            Circle(SKETCH11_R)
        with Locations(Location((0, 25, 0), (0, 0, 90))):
            Circle(SKETCH11_R)
    cut_extrude6 = extrude(amount=-CUT_EXTRUDE6_DEPTH, mode=Mode.SUBTRACT)

    # LPattern2: Cut-Extrude6 ×3
    with Locations(*[(0, 0, -i * LPATTERN2_PITCH) for i in range(1, LPATTERN2_COUNT)]):
        add(cut_extrude6, mode=Mode.SUBTRACT)

    # LPattern2 col: Cut-Extrude6 ×3
    with Locations(*[(0, 0, i * LPATTERN2_COL_PITCH) for i in range(1, LPATTERN2_COL_COUNT)]):
        add(cut_extrude6, mode=Mode.SUBTRACT)


solid = part.part
